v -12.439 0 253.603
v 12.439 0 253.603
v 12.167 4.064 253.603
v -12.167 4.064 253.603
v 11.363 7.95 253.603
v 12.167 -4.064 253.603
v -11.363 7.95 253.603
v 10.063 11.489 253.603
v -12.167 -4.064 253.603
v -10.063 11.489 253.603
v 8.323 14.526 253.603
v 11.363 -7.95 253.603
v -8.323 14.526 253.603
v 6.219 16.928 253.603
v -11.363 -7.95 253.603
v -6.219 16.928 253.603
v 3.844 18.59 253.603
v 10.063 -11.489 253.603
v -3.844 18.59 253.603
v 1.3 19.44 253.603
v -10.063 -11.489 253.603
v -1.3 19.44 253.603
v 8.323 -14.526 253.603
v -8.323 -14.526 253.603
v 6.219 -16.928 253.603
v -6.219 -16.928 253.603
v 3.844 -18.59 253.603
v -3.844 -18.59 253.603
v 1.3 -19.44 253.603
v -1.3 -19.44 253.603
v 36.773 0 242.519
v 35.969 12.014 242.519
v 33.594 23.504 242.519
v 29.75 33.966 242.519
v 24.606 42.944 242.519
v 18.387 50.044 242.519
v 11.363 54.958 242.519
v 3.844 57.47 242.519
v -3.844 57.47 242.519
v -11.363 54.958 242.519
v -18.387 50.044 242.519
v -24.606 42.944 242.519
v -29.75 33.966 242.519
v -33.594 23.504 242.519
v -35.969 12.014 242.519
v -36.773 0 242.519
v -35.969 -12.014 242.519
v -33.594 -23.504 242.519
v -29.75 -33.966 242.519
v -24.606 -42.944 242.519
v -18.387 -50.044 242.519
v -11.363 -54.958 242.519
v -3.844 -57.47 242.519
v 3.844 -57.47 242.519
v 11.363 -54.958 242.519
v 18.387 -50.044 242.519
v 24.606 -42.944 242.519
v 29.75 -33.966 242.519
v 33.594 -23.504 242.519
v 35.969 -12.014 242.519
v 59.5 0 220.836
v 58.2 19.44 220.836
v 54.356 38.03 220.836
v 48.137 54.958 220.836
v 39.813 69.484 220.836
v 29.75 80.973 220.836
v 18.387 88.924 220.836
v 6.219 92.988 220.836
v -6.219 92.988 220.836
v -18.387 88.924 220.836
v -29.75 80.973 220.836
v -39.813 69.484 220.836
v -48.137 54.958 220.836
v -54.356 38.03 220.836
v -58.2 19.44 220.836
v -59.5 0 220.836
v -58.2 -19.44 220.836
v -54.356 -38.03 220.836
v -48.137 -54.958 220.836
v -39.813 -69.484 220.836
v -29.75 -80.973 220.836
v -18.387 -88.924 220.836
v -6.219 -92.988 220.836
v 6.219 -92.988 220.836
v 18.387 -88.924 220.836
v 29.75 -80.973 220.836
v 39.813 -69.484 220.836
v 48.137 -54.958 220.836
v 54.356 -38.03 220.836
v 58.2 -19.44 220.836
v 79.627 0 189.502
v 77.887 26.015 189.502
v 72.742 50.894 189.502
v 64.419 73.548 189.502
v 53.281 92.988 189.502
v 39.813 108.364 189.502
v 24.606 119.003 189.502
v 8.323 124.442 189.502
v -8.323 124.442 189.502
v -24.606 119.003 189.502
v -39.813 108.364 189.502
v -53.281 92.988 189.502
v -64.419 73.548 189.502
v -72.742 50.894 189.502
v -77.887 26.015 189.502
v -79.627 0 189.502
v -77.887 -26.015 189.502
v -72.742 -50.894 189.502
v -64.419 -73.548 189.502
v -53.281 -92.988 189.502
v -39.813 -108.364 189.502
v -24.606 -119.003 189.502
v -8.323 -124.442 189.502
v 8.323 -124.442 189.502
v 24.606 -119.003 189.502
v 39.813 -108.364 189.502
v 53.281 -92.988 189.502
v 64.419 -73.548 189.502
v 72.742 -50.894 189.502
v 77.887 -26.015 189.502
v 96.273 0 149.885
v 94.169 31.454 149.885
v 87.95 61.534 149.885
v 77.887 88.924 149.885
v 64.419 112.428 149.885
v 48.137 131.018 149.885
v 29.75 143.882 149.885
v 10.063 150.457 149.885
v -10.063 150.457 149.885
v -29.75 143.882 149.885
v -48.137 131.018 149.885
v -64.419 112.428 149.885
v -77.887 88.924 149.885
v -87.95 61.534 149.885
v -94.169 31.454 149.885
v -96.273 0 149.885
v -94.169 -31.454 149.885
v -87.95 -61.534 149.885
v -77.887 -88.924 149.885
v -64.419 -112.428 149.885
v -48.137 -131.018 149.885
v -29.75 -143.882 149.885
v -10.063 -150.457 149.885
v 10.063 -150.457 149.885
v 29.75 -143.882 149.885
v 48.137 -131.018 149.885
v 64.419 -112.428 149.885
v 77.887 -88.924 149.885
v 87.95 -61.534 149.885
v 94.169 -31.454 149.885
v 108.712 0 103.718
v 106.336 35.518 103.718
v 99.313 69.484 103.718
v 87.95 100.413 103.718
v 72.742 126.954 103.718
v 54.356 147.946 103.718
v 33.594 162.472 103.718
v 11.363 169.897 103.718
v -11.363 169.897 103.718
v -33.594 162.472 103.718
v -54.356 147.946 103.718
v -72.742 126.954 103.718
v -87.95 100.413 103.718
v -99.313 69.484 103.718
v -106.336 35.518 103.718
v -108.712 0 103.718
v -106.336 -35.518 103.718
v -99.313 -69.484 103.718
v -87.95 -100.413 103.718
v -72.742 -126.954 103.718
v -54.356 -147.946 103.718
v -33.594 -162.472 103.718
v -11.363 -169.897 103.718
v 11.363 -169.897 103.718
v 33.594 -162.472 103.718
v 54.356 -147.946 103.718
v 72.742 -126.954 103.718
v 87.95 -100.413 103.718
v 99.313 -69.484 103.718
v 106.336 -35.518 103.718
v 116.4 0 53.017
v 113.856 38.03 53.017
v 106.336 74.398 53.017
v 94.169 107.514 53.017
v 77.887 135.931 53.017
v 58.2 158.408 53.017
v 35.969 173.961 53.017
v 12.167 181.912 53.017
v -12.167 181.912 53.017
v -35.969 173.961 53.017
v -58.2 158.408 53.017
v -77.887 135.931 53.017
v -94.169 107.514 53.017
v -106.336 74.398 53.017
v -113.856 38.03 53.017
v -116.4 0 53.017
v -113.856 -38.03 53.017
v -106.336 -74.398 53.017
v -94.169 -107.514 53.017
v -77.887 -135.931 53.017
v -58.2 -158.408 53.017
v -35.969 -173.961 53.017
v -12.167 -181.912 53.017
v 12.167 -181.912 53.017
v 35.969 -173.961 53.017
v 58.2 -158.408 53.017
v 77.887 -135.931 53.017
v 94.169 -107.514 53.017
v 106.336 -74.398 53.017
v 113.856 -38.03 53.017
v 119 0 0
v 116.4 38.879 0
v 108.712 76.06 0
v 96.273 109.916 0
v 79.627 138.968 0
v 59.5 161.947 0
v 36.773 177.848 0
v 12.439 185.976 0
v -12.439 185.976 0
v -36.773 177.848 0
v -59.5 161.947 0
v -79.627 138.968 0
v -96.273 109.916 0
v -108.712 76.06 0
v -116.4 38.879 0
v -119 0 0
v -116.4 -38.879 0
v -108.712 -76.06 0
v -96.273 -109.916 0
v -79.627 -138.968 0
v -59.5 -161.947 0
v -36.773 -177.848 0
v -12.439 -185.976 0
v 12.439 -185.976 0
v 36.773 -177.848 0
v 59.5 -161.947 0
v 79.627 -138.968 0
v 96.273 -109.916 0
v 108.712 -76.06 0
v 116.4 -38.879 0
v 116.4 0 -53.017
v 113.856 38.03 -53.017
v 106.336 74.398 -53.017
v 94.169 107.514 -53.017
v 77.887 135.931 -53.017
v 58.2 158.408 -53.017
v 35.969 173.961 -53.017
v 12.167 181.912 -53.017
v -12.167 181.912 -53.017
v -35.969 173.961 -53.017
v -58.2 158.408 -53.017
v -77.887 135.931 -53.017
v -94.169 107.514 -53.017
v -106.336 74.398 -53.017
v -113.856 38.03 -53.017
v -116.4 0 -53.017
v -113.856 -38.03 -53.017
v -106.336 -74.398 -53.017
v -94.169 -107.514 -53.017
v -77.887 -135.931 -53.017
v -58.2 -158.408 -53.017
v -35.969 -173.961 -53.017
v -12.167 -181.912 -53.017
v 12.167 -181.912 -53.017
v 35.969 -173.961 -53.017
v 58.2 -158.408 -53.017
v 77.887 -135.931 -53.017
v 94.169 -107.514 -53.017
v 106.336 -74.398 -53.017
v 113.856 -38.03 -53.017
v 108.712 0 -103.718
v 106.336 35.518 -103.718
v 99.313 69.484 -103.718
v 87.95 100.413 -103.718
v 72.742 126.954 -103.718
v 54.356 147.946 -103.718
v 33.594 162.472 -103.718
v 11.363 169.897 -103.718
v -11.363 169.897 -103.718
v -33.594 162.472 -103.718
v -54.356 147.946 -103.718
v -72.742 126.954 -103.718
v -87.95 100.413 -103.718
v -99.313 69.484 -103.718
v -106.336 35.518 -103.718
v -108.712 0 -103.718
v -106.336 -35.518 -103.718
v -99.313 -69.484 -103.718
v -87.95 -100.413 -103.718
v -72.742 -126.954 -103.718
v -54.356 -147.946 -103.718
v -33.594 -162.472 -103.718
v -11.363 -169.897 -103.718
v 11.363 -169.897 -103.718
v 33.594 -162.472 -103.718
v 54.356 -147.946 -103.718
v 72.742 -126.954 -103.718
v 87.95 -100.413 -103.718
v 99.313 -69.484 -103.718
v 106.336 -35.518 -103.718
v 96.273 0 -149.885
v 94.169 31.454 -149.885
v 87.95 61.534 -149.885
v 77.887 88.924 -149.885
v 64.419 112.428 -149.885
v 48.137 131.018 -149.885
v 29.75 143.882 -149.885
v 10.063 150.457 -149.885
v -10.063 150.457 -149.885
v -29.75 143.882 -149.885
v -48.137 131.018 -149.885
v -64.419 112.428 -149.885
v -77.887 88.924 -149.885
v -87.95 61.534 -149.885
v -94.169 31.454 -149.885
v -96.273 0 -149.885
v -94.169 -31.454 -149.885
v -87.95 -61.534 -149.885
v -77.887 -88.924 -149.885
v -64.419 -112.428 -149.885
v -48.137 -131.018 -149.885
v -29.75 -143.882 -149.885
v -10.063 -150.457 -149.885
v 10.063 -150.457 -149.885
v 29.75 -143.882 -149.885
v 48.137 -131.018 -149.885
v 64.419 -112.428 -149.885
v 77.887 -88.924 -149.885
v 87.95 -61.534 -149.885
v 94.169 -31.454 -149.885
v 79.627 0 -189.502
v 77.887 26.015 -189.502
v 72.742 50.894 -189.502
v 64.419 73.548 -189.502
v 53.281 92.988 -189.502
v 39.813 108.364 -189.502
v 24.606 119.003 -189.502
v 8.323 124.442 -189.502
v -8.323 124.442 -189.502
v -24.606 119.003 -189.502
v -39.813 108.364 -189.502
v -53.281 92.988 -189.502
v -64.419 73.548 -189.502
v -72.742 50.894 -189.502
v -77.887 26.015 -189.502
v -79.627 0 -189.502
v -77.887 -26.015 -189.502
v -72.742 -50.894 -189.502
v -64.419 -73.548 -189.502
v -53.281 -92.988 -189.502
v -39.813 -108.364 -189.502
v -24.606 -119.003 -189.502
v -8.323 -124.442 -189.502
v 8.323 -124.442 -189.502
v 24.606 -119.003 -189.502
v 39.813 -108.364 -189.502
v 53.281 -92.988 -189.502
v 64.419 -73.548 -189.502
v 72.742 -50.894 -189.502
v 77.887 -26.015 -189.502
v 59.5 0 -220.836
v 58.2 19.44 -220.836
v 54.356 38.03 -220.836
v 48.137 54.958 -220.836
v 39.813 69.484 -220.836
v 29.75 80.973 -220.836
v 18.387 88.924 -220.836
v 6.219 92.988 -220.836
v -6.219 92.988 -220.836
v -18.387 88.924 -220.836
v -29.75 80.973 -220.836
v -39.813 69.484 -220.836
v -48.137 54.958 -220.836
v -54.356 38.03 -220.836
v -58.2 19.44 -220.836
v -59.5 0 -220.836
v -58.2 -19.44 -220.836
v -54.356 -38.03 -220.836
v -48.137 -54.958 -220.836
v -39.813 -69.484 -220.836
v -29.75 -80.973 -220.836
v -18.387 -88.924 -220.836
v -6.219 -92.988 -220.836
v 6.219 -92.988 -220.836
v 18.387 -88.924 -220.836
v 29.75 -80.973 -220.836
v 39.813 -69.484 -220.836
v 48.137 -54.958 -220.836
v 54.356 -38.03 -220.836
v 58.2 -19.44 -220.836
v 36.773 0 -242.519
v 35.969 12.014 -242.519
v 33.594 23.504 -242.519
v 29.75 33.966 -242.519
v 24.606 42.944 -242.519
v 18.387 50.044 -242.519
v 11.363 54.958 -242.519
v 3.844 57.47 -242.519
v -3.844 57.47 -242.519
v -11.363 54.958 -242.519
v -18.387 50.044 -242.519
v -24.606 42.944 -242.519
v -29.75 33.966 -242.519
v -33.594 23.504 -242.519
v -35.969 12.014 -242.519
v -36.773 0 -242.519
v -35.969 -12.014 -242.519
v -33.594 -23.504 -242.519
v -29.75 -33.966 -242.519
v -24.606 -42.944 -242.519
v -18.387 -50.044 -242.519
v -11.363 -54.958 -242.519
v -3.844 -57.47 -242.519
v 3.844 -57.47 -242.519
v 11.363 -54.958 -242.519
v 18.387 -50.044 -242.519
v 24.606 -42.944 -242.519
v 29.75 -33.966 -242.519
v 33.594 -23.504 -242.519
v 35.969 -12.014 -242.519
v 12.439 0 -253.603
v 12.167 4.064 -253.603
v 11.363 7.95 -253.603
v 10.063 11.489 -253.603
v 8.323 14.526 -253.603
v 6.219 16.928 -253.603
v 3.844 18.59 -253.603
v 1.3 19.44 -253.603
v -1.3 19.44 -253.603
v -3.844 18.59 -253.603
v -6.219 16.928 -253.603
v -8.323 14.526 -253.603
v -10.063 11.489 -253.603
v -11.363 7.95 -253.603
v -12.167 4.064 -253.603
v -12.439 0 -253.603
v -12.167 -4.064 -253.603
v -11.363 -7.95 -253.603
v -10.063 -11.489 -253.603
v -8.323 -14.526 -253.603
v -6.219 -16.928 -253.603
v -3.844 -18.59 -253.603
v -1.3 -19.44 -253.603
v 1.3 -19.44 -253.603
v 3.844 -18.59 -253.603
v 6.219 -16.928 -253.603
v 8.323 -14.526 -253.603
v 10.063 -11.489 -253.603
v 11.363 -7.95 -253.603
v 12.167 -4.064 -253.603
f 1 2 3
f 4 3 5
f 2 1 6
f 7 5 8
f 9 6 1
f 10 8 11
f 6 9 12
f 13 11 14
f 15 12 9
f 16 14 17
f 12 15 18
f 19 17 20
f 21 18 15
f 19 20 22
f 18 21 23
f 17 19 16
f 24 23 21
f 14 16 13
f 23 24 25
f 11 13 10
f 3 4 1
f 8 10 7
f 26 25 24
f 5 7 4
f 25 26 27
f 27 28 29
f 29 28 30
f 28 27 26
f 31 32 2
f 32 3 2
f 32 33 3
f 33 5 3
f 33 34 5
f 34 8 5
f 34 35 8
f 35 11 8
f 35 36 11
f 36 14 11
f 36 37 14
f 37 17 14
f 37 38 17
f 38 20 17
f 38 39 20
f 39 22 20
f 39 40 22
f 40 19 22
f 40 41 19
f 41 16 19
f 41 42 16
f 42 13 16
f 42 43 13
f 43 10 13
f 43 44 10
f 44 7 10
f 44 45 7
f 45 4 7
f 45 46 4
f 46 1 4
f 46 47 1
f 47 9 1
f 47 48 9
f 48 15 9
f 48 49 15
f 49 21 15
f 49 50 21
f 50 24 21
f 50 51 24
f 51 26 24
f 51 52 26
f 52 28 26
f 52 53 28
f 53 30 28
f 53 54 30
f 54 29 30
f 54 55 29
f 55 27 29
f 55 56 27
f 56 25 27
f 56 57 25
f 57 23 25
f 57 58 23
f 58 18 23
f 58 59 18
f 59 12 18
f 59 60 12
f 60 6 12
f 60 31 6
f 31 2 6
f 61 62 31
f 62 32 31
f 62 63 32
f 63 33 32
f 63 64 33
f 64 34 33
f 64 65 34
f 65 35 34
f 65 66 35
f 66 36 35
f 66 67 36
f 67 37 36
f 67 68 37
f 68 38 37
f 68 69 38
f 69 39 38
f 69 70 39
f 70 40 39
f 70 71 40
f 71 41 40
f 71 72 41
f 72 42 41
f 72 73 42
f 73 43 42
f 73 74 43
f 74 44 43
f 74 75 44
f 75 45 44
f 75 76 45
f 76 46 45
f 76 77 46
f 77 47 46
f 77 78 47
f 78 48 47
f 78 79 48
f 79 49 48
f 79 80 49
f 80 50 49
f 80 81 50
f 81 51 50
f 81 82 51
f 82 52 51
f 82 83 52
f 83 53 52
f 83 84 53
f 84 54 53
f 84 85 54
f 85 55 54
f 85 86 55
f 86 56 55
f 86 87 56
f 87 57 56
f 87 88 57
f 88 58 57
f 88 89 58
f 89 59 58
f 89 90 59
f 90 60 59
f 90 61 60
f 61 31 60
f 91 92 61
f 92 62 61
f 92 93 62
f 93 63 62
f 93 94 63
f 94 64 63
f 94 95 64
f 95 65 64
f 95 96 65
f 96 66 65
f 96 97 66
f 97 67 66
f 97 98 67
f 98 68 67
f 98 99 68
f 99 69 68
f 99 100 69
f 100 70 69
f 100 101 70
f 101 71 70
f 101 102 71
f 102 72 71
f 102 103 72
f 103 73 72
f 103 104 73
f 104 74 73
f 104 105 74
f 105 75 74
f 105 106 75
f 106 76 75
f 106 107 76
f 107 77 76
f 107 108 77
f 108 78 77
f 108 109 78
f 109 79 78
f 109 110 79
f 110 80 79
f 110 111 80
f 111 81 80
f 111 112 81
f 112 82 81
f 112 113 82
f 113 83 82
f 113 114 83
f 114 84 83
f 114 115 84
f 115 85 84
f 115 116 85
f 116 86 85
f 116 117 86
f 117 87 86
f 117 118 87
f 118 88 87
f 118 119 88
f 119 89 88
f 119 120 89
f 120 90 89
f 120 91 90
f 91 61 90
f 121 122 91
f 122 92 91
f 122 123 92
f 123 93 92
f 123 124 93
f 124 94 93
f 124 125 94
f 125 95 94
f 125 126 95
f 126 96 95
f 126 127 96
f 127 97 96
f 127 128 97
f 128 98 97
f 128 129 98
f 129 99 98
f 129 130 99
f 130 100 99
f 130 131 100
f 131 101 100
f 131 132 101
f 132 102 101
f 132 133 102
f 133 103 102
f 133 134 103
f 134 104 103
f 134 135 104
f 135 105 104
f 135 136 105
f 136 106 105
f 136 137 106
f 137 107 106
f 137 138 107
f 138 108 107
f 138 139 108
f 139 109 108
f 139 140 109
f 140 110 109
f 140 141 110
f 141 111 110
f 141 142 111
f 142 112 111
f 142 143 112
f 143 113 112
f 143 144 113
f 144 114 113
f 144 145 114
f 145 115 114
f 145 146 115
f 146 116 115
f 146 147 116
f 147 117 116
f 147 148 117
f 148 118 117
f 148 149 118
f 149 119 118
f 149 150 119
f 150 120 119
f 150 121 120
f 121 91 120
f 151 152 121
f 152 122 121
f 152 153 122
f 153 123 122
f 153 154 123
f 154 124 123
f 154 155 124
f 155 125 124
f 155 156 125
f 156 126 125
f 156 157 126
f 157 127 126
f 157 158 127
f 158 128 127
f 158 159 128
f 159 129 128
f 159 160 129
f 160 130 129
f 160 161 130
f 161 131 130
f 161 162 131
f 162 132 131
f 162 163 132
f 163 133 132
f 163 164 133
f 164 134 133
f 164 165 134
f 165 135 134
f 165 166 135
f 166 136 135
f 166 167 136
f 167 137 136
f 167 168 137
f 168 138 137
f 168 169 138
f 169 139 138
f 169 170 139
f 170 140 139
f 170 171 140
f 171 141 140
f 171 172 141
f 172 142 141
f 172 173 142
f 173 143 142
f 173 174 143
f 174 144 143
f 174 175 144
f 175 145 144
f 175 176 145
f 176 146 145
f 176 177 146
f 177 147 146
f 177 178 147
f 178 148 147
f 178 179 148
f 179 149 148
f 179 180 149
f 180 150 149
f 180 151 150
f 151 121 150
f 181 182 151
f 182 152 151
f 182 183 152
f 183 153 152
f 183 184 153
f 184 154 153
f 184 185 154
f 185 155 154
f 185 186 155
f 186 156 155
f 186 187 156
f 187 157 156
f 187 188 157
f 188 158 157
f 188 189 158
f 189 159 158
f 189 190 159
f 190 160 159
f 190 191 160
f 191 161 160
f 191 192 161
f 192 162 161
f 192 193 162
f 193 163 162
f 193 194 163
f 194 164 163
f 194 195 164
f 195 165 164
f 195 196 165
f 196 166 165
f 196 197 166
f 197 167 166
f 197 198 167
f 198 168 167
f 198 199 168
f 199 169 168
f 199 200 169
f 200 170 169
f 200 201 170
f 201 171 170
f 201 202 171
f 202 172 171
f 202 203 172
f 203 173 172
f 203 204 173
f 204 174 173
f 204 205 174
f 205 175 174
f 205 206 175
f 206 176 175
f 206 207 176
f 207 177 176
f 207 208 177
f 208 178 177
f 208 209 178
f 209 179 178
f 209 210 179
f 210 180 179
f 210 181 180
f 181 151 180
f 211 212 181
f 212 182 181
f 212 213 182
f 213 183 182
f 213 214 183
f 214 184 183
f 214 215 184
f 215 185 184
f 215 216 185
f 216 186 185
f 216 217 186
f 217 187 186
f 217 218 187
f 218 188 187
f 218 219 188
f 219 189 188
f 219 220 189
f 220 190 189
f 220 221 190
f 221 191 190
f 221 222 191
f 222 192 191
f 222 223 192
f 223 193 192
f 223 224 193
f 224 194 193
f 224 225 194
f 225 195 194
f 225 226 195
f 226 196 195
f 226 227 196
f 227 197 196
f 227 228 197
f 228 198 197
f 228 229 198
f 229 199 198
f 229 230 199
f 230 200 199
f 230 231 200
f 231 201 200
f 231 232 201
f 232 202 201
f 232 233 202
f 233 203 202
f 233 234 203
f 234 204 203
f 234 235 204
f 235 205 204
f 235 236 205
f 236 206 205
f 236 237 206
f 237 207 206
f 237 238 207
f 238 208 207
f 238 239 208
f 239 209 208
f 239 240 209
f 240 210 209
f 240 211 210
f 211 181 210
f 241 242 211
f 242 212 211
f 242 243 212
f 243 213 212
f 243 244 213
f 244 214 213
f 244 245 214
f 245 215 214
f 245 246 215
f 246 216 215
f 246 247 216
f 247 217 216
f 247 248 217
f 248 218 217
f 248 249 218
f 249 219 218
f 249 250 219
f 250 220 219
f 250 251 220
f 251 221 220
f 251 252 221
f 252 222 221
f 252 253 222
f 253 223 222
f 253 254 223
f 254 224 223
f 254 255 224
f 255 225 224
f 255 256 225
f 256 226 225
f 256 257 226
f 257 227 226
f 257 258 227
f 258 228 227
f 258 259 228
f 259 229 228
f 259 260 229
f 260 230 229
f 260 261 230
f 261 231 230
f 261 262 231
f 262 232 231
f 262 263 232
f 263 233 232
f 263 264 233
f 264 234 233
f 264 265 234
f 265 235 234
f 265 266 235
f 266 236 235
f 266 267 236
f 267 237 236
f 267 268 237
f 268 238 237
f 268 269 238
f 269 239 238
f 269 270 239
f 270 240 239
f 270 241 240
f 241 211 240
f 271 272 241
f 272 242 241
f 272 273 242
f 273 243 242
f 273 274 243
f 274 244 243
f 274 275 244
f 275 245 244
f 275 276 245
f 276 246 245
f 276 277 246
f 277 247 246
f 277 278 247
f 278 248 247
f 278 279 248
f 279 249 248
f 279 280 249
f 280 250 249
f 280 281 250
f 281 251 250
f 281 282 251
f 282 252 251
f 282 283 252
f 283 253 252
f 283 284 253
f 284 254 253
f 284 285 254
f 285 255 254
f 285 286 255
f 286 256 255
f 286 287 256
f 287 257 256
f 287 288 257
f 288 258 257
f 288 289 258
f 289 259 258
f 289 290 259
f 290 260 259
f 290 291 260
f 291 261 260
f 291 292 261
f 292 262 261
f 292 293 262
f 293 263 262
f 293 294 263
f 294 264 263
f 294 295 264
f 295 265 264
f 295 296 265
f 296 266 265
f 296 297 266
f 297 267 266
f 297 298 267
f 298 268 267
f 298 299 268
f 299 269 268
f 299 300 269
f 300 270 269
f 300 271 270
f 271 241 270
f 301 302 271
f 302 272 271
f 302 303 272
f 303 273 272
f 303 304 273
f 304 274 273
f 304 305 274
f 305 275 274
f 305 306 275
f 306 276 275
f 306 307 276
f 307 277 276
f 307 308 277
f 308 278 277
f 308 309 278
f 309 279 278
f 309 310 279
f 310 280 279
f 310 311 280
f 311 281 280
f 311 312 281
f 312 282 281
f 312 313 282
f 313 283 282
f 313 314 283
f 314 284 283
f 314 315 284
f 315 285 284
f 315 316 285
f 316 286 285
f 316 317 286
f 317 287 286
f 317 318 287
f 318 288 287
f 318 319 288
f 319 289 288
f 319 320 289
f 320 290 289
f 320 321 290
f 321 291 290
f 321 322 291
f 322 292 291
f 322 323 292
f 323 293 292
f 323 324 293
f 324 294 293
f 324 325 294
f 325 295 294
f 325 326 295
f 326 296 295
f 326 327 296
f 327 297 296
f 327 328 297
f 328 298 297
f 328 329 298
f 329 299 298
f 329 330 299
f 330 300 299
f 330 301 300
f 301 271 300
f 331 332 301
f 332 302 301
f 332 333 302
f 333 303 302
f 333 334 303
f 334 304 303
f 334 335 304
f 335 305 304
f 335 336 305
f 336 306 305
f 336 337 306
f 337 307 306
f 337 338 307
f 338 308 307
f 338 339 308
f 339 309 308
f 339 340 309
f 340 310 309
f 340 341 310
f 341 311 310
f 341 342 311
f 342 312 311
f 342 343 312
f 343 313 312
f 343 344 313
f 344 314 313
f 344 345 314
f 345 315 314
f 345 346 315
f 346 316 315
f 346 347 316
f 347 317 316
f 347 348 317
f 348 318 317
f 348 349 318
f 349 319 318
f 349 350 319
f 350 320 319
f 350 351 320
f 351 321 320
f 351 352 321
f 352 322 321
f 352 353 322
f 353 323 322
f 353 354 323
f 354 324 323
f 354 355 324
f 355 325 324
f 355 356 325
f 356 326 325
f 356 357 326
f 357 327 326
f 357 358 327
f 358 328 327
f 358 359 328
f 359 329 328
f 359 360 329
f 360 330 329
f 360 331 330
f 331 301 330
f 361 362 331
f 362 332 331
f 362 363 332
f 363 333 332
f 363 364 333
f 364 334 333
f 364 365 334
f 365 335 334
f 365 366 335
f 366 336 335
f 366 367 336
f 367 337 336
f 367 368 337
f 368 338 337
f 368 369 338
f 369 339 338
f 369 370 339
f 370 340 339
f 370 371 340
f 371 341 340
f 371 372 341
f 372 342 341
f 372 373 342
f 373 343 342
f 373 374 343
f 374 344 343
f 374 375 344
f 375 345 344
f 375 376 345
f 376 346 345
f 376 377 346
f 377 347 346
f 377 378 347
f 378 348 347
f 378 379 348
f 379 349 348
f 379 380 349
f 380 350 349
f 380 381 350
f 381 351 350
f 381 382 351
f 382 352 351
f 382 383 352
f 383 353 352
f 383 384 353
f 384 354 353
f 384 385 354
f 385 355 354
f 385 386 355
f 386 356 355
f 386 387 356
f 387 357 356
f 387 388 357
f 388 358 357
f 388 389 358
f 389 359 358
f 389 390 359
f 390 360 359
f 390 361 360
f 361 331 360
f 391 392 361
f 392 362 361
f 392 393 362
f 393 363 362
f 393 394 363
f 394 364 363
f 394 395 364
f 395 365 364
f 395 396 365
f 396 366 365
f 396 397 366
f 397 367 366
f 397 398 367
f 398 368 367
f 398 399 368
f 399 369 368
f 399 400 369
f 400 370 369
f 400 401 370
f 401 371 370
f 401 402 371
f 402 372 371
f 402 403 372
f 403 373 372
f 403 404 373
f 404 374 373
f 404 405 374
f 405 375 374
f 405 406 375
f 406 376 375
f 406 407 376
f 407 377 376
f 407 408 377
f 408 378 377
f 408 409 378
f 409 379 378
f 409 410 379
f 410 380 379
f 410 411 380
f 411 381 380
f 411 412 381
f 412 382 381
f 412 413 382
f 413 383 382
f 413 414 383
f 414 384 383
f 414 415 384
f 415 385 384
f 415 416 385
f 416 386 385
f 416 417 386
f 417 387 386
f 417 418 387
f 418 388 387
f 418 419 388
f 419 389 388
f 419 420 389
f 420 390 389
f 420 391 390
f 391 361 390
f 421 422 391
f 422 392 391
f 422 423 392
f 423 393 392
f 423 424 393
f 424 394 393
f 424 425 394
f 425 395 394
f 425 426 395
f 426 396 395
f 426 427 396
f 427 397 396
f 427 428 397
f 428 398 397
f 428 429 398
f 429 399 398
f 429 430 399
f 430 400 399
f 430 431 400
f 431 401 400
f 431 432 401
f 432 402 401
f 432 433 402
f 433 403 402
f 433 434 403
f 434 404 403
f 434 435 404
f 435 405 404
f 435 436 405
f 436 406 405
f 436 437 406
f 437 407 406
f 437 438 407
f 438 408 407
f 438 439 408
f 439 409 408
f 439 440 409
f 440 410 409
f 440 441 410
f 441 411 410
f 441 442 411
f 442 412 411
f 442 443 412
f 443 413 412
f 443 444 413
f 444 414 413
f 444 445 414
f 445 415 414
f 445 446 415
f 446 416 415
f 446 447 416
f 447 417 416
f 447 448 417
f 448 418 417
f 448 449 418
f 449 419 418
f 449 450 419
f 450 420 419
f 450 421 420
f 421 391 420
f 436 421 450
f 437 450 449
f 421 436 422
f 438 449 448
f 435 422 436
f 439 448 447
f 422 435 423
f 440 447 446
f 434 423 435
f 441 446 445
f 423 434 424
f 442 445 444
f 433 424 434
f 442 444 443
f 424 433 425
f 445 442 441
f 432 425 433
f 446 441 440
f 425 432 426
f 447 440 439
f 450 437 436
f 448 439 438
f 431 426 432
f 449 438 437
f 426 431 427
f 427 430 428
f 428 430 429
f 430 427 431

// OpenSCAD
// Generated by SolidPython 1.0.1 on 2020-07-29 00:46:47


scale(v = [7, 11, 15]) {
	sphere(r = 17);
}
/***********************************************
*********      SolidPython code:      **********
************************************************
 
# import packages: SolidPython
from solid import *
from solid.utils import *
from itertools import chain, combinations, permutations


class Resize:

    def __init__(self, scad_file):
        self.scad_file = scad_file
        #self.scad_file = import_scad(scad_file)
        # cone/cylinder param:
        self.r1 = 0
        self.r2 = 0
        self.h = 0
        # rectangular prism param:
        self.w = 0
        self.l = 0
        # ellipse param:
        self.r = 0

    # import OpenScad code (file name corresponds to shape)


    # classify shape + parameters
    def assign(self, param1, param2, param3):
        if self.scad_file == 'cone.scad':
            self.r1 = param1
            self.r2 = param2
            self.h = param3
        elif self.scad_file == 'cylinder.scad':
            self.r1 = param1
            self.r2 = param2
            self.h = param3
        elif self.scad_file == 'rectangularPrism.scad':
            self.h = param1
            self.l = param2
            self.w = param3
        else:
            self.r = param1
            self.h = param2

    # resize parameters
    def iterate(self):
        x = range(3, 20, 2)
        i = 1
        if self.scad_file == 'cone.scad':
            tempList = list(permutations(x, 2))
            for temp in tempList:
                param1 = temp[0]
                param2 = temp[1]
                filepath = 'produced_scad_files/' + 'cone' + str(param1) + '_' + str(param2) + '_' + '.scad'
                scad_render_to_file(cylinder(h=param1, r1=param2, r2=0), filepath)

        elif self.scad_file == 'cylinder.scad':
            tempList = list(permutations(x, 3))
            for temp in tempList:
                param1 = temp[0]
                param2 = temp[1]
                filepath = 'produced_scad_files/' + 'cylinder' + str(param1) + '_' + str(param2) + '_' + '.scad'
                scad_render_to_file(cylinder(h=param1, r1=param2, r2=param2), filepath)

        elif self.scad_file == 'rectangularPrism.scad':
            tempList = list(permutations(x, 3))
            for temp in tempList:
                param1 = temp[0]
                param2 = temp[1]
                param3 = temp[2]
                filepath = 'produced_scad_files/' + 'rectangularPrism' + str(param1) + '_' + str(param2) + '_' + str(
                    param3) + '.scad'
                scad_render_to_file(cube(size=(param1, param2, param3)), filepath)

        elif self.scad_file == 'ellipse.scad':
            tempList = list(permutations(x, 4))
            for temp in tempList:
                param1 = temp[0]
                param2 = temp[1]
                param3 = temp[2]
                param4 = temp[3]
                filepath = 'produced_scad_files/' + 'ellipse' + str(param1) + '_' + str(param2) + '_' + str(param3) + '_' + str(param4) + '.scad'
                scad_render_to_file(scale([param1, param2, param3])(sphere(r=param4)), filepath)

    def render_to_scadfile(self):
        scad_render_to_file(scad, 'example.scad') 
 
************************************************/
